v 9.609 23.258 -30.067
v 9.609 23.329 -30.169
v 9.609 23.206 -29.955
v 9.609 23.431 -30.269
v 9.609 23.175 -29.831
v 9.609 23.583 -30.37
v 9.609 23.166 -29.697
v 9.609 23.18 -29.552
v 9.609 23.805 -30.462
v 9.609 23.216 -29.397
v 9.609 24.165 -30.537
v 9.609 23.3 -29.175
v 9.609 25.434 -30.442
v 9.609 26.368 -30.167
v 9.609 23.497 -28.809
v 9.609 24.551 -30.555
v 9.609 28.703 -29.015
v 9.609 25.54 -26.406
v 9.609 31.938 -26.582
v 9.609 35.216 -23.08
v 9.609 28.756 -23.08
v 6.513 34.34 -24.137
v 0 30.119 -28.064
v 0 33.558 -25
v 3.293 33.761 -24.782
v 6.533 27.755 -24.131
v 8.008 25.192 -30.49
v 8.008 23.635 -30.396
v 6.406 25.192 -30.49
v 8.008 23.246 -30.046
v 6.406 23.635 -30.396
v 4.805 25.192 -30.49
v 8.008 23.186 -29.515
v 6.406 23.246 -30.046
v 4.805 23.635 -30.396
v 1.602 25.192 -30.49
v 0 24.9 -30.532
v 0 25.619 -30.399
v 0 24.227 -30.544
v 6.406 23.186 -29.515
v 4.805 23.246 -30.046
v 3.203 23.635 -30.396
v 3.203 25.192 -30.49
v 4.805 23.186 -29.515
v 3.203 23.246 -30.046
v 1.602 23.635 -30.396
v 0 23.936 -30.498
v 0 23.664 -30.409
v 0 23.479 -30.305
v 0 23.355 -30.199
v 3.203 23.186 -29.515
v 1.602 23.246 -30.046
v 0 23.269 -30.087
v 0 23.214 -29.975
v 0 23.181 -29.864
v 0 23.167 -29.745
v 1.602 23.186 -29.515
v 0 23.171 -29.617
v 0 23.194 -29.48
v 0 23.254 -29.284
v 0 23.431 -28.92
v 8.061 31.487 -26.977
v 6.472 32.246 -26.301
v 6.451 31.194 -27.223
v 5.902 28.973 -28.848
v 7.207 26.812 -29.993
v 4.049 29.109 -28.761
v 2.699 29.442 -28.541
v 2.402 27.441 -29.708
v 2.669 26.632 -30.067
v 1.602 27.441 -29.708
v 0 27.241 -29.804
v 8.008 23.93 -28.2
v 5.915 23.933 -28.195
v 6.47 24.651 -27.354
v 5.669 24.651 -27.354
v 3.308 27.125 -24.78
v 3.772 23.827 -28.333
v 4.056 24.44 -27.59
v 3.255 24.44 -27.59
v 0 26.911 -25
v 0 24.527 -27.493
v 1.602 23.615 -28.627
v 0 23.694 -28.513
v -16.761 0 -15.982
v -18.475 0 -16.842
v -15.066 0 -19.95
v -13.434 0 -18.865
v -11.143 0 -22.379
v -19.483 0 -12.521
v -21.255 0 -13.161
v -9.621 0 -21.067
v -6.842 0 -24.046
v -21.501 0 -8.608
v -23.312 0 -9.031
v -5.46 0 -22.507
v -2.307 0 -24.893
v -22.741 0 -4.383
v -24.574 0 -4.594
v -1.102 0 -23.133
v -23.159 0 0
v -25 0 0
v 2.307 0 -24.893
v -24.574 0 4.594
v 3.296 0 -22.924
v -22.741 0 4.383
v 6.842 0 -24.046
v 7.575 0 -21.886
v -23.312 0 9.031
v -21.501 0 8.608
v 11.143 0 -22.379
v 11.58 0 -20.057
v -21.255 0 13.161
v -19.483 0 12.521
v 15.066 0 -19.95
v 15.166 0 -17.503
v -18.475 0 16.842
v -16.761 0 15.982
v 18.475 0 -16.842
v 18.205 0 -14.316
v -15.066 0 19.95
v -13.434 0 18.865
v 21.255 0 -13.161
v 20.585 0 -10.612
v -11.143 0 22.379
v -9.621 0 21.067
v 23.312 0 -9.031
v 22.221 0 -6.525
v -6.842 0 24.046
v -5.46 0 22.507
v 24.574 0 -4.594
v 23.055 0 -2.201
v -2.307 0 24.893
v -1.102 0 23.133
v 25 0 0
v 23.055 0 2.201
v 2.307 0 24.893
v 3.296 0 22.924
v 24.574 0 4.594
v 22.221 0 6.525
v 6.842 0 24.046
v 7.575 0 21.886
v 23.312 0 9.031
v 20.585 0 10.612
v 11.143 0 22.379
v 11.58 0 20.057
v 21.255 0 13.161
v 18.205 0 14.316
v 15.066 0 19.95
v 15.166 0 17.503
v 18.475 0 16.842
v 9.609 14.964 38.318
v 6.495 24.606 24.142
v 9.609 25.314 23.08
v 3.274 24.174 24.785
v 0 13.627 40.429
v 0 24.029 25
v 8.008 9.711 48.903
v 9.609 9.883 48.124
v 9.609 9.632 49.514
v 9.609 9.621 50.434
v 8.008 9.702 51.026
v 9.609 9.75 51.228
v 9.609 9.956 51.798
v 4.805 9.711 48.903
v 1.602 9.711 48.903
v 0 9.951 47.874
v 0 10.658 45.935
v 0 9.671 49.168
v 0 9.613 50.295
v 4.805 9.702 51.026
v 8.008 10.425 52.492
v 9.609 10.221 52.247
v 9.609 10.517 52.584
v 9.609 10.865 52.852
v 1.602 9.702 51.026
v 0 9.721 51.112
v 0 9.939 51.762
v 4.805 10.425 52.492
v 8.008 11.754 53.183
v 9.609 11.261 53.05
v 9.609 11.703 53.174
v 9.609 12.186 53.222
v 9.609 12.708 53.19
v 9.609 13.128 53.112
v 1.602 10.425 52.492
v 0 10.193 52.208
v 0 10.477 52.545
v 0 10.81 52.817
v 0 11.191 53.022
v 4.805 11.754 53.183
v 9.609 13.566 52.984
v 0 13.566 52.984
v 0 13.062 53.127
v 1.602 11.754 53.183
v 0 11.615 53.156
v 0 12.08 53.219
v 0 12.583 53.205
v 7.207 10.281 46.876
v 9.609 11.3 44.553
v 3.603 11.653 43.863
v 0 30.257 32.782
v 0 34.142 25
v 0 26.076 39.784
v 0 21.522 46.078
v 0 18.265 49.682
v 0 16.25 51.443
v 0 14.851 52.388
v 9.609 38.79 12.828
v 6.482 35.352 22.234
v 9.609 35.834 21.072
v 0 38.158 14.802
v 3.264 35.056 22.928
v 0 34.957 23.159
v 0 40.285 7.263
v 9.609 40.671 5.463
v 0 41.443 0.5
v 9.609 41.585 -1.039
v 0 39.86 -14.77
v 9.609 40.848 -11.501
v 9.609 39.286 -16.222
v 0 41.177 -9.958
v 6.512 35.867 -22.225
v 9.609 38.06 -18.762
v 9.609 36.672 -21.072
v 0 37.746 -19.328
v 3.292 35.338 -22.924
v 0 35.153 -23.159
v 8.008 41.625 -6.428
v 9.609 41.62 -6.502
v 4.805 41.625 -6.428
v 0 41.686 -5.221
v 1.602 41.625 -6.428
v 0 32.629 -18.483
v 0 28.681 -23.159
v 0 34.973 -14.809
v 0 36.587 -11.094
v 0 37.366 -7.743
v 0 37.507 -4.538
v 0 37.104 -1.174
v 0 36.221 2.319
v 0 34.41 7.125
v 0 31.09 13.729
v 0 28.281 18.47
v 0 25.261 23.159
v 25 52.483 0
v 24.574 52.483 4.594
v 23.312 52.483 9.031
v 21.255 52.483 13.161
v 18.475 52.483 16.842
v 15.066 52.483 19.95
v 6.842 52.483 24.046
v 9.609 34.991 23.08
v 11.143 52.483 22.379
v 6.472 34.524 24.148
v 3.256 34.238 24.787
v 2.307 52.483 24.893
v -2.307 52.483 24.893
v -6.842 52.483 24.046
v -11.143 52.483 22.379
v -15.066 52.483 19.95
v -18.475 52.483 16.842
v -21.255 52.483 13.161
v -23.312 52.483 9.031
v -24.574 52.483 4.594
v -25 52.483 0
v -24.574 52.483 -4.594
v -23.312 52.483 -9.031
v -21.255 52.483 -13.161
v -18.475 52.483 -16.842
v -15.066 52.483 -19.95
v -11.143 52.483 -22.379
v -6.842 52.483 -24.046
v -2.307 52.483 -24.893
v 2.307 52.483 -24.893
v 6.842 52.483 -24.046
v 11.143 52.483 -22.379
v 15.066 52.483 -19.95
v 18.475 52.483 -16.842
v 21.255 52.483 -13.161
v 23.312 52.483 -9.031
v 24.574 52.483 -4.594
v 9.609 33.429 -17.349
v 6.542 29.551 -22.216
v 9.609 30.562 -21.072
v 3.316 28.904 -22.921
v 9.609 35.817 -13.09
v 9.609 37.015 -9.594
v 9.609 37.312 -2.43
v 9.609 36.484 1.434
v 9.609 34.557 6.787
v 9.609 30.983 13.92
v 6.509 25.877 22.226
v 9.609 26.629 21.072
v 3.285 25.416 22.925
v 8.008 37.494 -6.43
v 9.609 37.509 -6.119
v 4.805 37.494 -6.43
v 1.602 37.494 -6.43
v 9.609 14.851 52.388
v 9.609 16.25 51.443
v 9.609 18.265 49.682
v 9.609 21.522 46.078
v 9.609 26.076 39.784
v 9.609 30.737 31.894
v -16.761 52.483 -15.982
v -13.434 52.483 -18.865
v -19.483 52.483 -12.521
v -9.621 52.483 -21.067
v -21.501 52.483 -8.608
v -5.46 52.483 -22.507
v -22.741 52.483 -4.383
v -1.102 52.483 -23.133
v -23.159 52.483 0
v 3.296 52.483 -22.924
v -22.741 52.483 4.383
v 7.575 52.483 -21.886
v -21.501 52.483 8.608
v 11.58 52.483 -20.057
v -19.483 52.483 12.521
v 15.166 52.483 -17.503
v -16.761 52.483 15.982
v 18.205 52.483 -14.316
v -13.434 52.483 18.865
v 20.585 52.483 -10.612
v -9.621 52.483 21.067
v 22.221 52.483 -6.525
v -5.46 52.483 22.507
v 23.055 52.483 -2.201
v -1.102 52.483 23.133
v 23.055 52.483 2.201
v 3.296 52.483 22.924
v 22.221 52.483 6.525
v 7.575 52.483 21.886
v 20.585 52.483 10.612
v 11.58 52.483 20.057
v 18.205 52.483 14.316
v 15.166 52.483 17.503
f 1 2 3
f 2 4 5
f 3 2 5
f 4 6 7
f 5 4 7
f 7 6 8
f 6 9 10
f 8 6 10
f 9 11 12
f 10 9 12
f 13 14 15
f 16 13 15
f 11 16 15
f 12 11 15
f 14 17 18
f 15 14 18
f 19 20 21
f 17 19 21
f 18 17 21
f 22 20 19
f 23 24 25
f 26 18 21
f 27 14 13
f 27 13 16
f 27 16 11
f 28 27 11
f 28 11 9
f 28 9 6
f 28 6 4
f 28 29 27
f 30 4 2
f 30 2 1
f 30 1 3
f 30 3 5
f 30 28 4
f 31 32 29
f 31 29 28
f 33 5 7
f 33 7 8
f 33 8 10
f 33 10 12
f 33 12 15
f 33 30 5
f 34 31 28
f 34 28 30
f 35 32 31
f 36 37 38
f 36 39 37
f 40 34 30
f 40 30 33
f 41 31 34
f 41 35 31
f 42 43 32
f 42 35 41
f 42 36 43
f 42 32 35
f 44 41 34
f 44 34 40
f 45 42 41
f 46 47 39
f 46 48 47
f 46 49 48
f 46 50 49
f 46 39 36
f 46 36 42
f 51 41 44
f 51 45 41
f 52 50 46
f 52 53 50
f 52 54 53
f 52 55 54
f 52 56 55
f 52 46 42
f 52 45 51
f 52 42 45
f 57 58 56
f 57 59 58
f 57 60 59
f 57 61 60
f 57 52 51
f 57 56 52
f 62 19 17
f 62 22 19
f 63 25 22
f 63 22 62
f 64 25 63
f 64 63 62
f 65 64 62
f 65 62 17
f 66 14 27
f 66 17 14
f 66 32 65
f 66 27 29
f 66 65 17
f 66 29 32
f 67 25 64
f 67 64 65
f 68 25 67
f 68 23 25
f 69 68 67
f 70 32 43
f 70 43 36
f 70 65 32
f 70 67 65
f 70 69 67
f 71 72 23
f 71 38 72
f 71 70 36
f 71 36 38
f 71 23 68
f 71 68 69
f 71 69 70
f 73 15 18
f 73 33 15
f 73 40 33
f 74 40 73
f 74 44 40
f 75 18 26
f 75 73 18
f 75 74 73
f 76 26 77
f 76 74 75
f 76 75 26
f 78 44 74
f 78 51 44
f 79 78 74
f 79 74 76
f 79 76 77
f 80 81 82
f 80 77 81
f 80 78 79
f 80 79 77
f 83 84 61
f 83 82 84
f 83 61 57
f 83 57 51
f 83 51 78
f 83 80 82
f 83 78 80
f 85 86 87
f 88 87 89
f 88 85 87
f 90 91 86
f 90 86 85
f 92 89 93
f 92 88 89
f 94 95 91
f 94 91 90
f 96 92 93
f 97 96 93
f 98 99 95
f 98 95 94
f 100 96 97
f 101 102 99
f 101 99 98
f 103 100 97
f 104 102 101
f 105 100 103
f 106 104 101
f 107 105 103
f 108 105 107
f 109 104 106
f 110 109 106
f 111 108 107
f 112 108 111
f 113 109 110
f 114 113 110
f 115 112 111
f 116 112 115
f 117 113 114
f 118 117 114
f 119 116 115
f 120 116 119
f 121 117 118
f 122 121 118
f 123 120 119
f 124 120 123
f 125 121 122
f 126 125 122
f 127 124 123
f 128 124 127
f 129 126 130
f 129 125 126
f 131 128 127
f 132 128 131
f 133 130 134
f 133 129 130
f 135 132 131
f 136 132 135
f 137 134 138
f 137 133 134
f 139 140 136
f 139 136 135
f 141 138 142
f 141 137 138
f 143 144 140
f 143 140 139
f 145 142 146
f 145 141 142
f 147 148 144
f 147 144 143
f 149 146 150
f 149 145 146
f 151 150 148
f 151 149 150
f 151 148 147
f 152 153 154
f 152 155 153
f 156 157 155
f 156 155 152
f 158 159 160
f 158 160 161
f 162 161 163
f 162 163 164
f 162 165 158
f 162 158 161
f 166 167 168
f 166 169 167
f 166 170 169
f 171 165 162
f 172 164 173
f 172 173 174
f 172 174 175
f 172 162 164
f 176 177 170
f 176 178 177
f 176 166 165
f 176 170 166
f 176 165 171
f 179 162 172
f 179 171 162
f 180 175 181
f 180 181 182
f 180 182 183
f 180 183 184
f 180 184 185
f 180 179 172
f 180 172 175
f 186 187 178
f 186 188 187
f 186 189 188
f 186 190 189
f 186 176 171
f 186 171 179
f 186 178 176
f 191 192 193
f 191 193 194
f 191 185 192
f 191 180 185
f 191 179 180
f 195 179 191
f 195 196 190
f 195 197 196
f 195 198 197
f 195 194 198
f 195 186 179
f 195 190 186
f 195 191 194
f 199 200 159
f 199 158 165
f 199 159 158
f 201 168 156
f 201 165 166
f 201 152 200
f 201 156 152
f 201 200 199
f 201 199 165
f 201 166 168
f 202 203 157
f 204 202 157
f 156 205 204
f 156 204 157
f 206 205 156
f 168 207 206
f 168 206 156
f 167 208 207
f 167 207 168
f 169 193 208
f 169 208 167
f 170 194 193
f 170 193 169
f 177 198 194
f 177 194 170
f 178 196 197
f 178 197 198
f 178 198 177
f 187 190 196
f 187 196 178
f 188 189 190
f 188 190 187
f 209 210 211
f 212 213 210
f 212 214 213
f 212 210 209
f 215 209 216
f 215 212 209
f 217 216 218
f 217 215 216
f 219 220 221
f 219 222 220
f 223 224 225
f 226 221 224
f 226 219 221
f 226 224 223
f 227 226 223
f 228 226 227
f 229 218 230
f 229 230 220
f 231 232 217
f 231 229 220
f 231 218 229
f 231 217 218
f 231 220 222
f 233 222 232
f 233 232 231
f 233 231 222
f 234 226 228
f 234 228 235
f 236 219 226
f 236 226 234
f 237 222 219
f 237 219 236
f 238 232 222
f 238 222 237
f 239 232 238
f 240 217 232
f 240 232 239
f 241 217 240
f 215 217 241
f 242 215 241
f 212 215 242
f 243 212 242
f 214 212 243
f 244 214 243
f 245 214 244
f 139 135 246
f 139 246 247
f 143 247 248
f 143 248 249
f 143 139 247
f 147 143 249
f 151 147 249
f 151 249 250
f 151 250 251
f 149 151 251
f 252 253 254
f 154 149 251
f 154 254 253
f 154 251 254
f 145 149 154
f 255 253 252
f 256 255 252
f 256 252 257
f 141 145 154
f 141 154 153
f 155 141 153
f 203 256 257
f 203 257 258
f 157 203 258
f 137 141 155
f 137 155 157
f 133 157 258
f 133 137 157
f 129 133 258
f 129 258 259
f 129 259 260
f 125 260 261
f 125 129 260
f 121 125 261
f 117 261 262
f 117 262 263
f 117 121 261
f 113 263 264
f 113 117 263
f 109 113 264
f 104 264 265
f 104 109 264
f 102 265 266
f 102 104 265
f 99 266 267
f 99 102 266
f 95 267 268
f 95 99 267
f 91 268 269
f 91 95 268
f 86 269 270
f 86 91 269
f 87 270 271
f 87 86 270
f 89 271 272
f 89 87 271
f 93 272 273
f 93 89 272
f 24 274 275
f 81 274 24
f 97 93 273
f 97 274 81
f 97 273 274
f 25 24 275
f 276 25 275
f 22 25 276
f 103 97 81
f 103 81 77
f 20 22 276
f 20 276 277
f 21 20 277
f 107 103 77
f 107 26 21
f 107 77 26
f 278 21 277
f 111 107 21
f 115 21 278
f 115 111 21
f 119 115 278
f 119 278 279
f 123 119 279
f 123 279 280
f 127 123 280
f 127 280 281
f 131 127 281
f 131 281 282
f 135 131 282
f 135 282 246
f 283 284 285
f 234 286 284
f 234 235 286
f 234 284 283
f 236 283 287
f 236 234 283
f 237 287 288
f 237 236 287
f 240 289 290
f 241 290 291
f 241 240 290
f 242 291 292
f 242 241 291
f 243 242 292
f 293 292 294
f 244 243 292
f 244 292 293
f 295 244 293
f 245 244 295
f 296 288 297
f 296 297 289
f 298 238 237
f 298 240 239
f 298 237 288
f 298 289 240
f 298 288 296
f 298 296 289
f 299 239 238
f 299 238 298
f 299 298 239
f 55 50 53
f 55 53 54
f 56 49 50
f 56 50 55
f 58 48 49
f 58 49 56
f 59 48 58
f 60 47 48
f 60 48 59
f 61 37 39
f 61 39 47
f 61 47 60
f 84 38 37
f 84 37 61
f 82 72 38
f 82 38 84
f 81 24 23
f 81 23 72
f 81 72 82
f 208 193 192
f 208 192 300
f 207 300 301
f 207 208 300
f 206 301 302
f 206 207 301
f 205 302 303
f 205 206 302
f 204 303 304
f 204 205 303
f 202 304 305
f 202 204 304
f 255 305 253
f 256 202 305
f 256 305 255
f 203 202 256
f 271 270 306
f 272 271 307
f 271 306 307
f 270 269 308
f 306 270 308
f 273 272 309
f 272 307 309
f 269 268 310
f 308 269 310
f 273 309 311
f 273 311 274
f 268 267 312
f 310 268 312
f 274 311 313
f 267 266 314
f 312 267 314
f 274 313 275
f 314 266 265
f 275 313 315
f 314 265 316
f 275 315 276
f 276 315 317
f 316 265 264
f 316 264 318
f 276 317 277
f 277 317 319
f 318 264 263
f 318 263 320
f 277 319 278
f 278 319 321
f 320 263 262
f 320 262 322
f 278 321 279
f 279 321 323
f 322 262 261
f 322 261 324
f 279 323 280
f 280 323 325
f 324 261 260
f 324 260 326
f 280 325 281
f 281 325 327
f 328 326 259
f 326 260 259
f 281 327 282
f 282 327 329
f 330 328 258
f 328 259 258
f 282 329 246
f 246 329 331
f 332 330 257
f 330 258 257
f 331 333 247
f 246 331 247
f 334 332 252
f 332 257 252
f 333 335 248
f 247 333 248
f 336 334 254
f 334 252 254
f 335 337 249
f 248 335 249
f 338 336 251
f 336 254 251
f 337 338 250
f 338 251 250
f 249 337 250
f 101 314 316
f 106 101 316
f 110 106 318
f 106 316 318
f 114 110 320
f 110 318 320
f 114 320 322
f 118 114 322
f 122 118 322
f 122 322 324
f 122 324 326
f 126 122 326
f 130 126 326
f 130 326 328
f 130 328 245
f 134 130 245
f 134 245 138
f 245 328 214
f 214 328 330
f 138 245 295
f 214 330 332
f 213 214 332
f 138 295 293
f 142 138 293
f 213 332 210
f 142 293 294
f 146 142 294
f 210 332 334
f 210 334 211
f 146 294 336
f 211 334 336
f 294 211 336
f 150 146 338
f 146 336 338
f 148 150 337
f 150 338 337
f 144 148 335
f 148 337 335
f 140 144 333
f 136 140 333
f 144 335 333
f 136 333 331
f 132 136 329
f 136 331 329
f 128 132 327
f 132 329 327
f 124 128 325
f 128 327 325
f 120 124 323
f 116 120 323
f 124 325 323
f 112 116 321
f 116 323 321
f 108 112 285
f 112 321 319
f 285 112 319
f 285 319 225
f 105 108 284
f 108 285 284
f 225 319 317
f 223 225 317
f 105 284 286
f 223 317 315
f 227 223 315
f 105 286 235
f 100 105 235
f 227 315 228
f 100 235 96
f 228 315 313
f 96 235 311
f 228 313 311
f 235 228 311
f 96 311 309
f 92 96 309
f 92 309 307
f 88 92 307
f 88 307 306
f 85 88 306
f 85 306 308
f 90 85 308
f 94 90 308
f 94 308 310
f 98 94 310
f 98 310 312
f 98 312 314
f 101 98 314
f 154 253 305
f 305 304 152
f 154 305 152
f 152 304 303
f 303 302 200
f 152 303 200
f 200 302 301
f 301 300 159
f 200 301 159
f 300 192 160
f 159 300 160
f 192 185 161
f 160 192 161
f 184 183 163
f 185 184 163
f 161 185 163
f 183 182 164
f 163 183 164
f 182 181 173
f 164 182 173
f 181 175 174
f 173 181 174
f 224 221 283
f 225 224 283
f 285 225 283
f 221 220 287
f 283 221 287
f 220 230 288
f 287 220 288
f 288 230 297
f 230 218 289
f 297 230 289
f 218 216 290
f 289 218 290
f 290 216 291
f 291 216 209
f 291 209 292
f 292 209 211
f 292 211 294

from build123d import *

# Parameters (mm, degrees)
F0_R     = 25
F1_DEPTH = 52.483310923
F4_R     = 23.1594972358
F5_DEPTH = 56.222954765
F7_DEPTH = 9.6091050655


# Not quite as in the source:
# - the program builds the solid bodies; features that only make, move or delete a surface that nothing else refers to are left out


with BuildPart() as f1:
    # F0 (on Front) → F1 (new body)
    with BuildSketch(Plane.XZ):
        Circle(F0_R)
    extrude(amount=-F1_DEPTH)

    # F4 (on face) → F5 (cut)
    with BuildSketch(Plane(origin=(0, 52.483310923, 0), x_dir=(-1, 0, 0), z_dir=(0, 1, 0))):
        Circle(F4_R)
    extrude(amount=-F5_DEPTH, mode=Mode.SUBTRACT)

    # F6 (on Right) → F7 (join)
    with BuildSketch(Plane.YZ):
        with BuildLine():
            add(Edge.make_bspline(
                [(13.5661605746, 52.984289825), (22.7453749365, 49.8663088316), (56.6867603684, -7.723565307), (26.9795580338, -32.0941370462), (20.0288116996, -29.0080395676), (56.4506404561, -5.9541746073), (3.4222546759, 46.2227244929), (10.8831347215, 53.8956557965), (13.5661605746, 52.984289825)],
                knots=[0, 0, 0, 0, 0.2662310005, 0.4435228486, 0.4925757944, 0.6637410127, 0.9221823754, 1, 1, 1, 1], degree=3))
        make_face()
    extrude(amount=F7_DEPTH)


solid = f1.part
